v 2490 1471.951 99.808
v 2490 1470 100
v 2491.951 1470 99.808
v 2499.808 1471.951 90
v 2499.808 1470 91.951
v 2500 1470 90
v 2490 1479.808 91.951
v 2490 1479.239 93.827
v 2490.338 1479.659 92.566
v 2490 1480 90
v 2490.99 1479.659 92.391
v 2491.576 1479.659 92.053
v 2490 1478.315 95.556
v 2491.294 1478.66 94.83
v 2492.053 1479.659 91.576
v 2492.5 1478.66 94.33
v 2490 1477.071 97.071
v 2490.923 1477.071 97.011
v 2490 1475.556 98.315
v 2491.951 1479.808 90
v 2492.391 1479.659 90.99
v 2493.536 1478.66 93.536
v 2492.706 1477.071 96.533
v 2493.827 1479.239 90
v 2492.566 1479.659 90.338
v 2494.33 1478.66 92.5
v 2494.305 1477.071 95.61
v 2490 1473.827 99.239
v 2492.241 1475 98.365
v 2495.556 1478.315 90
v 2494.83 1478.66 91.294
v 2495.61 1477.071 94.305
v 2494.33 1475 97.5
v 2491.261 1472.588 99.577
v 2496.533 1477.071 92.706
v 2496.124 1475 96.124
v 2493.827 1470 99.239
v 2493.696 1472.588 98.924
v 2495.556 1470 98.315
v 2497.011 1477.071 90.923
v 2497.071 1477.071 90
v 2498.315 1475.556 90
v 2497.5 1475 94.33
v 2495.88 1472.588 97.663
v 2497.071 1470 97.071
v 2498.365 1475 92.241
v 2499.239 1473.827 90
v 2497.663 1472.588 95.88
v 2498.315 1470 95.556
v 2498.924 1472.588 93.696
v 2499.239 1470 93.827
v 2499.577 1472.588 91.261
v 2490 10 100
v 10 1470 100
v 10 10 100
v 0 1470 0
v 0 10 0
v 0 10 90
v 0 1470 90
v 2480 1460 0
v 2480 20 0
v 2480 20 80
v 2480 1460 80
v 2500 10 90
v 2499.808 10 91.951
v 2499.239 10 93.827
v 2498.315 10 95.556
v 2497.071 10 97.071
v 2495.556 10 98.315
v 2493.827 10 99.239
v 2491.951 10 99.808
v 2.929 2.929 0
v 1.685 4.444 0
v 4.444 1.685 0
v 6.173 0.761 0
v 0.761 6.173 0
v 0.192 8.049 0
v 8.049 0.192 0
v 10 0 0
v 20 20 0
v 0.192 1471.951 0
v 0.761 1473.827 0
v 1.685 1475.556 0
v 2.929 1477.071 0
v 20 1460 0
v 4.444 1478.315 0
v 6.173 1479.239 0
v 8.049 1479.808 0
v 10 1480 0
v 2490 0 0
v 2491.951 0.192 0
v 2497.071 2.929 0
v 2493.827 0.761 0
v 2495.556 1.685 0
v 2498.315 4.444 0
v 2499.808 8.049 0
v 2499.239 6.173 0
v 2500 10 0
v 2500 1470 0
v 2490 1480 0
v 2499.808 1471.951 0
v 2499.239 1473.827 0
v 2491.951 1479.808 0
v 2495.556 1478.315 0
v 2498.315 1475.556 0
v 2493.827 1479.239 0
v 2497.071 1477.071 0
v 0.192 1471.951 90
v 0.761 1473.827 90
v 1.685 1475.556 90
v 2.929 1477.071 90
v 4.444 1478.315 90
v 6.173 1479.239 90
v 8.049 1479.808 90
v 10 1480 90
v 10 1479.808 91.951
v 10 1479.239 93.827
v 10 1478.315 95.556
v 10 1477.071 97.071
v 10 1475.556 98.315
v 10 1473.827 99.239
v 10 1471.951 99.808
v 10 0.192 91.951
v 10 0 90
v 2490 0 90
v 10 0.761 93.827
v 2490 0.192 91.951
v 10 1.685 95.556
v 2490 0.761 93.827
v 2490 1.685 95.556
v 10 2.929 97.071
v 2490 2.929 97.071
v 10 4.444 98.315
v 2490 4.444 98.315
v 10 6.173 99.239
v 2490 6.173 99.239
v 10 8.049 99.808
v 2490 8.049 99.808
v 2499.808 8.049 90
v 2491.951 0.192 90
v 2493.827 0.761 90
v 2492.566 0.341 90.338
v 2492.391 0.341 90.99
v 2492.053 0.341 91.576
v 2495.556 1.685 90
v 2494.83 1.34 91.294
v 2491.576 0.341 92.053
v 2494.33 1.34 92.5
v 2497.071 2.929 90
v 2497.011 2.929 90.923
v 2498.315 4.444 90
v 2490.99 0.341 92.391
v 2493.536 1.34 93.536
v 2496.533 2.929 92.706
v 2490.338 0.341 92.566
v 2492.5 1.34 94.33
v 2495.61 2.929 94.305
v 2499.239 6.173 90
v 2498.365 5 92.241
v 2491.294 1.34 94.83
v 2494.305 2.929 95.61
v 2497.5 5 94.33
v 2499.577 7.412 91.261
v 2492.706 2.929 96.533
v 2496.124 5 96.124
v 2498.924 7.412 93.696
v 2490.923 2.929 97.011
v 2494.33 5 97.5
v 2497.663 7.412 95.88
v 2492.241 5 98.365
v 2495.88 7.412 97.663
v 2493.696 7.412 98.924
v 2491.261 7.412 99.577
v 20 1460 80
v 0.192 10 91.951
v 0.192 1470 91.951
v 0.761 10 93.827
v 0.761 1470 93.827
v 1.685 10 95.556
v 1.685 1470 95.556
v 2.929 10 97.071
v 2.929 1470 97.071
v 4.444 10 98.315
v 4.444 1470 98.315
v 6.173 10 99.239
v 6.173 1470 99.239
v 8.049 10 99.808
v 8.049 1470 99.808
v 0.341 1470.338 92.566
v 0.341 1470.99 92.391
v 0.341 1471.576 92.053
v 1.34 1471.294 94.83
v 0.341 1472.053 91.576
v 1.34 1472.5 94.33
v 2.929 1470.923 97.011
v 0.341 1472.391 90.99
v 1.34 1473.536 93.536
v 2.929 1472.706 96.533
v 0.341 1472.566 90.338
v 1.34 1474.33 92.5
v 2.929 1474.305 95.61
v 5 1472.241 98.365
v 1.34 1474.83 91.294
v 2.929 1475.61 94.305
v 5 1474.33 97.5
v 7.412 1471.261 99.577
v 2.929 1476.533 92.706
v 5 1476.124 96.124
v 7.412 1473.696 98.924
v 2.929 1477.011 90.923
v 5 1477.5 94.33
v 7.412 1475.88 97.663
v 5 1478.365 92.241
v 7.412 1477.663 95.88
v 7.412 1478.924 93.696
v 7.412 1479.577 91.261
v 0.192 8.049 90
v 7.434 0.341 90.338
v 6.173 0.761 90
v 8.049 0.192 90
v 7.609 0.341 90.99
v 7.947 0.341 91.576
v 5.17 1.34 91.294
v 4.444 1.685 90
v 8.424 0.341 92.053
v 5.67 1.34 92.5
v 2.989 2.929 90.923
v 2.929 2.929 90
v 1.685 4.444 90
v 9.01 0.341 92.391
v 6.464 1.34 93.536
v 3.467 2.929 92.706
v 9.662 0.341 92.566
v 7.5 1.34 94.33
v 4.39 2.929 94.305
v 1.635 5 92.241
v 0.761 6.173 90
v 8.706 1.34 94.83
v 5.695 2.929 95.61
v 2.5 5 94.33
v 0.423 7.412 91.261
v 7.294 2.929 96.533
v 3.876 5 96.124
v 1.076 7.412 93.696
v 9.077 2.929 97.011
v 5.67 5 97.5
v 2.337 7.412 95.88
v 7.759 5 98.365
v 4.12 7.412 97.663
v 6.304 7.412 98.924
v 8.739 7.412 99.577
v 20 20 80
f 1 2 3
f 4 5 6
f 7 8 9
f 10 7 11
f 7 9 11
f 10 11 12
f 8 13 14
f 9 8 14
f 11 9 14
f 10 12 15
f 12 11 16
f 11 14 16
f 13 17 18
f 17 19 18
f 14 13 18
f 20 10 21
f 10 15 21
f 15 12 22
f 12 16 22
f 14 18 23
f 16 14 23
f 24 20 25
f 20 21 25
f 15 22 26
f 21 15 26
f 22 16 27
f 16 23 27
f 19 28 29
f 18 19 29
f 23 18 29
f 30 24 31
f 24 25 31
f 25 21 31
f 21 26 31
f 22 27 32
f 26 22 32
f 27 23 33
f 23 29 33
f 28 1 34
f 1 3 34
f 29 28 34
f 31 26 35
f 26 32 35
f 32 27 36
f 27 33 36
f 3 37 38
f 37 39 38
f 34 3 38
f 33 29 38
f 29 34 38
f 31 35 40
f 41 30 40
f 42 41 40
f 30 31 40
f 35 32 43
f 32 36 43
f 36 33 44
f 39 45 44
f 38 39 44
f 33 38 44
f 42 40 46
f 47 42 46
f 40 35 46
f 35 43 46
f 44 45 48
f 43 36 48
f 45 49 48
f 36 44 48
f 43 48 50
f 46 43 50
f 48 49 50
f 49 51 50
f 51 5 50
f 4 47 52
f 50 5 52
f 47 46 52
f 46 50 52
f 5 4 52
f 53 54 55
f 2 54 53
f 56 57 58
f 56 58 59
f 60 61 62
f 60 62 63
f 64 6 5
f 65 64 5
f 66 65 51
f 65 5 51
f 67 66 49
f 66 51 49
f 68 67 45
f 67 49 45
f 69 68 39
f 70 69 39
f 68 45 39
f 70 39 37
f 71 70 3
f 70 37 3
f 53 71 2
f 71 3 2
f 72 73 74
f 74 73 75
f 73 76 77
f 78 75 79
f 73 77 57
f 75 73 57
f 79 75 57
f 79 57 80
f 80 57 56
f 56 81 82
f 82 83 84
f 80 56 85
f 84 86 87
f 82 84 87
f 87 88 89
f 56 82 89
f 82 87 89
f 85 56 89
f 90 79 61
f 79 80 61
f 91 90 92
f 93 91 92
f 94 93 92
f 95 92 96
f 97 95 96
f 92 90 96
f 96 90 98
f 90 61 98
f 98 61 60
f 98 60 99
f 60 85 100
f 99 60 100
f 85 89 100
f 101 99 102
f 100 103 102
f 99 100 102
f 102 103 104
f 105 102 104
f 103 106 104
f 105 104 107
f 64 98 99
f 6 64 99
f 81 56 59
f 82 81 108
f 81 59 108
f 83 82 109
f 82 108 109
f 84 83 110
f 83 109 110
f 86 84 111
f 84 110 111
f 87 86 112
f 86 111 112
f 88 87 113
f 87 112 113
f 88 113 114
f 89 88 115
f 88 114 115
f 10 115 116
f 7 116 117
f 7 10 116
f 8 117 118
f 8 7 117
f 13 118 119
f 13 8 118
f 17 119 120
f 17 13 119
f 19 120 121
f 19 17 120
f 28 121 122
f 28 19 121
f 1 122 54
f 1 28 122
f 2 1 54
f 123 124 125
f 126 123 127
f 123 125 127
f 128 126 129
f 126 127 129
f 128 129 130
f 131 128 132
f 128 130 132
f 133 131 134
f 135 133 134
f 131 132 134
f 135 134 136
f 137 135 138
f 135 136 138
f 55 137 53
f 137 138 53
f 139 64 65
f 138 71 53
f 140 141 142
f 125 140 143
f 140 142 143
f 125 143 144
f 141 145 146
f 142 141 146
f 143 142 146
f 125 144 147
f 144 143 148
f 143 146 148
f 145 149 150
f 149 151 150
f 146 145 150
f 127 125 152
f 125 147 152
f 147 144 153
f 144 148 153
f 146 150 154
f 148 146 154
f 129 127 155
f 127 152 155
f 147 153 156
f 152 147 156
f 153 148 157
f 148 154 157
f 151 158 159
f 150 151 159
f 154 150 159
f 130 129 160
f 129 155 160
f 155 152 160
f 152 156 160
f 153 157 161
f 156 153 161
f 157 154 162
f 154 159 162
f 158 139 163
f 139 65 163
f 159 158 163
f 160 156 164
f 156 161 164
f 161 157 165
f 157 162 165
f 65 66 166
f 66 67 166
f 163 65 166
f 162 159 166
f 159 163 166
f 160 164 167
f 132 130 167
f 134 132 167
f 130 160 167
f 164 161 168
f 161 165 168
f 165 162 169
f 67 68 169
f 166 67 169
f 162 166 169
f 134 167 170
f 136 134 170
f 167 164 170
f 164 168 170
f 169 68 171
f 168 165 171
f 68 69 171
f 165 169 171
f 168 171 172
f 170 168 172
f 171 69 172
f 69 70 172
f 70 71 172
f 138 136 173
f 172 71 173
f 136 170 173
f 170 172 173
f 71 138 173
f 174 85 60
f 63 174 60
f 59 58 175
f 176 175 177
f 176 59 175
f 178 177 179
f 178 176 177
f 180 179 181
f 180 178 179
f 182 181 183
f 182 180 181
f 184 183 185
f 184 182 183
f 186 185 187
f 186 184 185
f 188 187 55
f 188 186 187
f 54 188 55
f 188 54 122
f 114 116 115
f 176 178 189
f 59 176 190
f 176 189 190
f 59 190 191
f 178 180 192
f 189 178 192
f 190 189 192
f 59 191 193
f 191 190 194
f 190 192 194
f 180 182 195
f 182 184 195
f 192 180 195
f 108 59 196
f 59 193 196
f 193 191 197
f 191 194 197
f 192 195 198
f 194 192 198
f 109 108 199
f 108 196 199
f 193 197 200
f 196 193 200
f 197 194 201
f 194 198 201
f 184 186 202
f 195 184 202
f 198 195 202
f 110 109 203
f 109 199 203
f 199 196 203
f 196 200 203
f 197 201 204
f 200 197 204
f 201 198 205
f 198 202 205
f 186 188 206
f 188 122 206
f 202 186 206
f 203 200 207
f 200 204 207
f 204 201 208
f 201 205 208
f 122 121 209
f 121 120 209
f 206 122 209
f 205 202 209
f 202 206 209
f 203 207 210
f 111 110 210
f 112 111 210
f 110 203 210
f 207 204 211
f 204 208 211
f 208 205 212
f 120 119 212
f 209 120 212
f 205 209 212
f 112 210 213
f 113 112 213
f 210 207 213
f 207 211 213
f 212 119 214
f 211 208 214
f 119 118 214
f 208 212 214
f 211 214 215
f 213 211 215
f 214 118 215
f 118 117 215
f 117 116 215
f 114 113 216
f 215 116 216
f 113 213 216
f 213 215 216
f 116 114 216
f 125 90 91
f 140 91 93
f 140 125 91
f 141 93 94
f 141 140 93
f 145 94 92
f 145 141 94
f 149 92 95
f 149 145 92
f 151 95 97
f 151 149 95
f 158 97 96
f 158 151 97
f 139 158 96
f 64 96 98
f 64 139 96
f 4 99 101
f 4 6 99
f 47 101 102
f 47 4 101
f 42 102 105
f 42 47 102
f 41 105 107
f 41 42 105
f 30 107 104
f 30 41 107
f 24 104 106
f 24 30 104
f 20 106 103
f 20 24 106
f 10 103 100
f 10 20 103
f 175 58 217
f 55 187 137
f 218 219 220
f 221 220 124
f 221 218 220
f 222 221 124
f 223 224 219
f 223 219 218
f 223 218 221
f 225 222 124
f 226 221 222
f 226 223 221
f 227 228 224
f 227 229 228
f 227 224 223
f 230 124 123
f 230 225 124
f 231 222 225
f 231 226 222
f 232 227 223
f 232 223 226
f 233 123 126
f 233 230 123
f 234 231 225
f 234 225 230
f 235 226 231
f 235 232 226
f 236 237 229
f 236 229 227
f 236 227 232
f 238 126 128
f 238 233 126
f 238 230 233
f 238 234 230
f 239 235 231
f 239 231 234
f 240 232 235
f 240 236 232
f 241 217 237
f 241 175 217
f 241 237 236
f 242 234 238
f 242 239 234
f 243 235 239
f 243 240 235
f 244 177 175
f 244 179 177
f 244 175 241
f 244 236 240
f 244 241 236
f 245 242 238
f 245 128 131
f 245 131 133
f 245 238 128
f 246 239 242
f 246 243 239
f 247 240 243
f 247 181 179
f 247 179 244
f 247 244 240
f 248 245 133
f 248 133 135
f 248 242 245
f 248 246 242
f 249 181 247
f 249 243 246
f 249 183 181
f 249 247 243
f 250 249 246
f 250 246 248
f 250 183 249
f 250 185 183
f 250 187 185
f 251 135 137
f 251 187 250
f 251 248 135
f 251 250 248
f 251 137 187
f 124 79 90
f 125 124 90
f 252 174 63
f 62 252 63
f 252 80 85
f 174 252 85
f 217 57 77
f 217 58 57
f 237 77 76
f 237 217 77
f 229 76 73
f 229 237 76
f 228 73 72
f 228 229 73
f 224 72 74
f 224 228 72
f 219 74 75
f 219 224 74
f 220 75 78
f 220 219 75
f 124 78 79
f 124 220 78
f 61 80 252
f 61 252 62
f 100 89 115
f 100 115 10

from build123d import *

# Parameters (mm, degrees)
SKETCH1_W           = 2500
SKETCH1_H           = 1480
BOSS_EXTRUDE1_DEPTH = 100
SHELL1_T            = -20
FILLET1_R           = 10


with BuildPart() as part:
    # Sketch1 → Boss-Extrude1 (new body)
    with BuildSketch(Plane.XY):
        with Locations((1250, 740)):
            Rectangle(SKETCH1_W, SKETCH1_H)
    extrude(amount=BOSS_EXTRUDE1_DEPTH)

    # Shell1
    shell1_openings = [part.faces().sort_by_distance(p)[0] for p in [
        (1250, 740, 0),
    ]]
    offset(amount=SHELL1_T, openings=shell1_openings, kind=Kind.INTERSECTION)

    # Fillet1
    fillet1_edges = [part.edges().sort_by_distance(p)[0] for p in [
        (2500, 740, 100),
        (1250, 1480, 100),
        (0, 740, 100),
        (0, 1480, 50),
        (2500, 1480, 50),
        (2500, 0, 50),
        (0, 0, 50),
        (1250, 0, 100),
    ]]
    fillet(fillet1_edges, radius=FILLET1_R)


solid = part.part
